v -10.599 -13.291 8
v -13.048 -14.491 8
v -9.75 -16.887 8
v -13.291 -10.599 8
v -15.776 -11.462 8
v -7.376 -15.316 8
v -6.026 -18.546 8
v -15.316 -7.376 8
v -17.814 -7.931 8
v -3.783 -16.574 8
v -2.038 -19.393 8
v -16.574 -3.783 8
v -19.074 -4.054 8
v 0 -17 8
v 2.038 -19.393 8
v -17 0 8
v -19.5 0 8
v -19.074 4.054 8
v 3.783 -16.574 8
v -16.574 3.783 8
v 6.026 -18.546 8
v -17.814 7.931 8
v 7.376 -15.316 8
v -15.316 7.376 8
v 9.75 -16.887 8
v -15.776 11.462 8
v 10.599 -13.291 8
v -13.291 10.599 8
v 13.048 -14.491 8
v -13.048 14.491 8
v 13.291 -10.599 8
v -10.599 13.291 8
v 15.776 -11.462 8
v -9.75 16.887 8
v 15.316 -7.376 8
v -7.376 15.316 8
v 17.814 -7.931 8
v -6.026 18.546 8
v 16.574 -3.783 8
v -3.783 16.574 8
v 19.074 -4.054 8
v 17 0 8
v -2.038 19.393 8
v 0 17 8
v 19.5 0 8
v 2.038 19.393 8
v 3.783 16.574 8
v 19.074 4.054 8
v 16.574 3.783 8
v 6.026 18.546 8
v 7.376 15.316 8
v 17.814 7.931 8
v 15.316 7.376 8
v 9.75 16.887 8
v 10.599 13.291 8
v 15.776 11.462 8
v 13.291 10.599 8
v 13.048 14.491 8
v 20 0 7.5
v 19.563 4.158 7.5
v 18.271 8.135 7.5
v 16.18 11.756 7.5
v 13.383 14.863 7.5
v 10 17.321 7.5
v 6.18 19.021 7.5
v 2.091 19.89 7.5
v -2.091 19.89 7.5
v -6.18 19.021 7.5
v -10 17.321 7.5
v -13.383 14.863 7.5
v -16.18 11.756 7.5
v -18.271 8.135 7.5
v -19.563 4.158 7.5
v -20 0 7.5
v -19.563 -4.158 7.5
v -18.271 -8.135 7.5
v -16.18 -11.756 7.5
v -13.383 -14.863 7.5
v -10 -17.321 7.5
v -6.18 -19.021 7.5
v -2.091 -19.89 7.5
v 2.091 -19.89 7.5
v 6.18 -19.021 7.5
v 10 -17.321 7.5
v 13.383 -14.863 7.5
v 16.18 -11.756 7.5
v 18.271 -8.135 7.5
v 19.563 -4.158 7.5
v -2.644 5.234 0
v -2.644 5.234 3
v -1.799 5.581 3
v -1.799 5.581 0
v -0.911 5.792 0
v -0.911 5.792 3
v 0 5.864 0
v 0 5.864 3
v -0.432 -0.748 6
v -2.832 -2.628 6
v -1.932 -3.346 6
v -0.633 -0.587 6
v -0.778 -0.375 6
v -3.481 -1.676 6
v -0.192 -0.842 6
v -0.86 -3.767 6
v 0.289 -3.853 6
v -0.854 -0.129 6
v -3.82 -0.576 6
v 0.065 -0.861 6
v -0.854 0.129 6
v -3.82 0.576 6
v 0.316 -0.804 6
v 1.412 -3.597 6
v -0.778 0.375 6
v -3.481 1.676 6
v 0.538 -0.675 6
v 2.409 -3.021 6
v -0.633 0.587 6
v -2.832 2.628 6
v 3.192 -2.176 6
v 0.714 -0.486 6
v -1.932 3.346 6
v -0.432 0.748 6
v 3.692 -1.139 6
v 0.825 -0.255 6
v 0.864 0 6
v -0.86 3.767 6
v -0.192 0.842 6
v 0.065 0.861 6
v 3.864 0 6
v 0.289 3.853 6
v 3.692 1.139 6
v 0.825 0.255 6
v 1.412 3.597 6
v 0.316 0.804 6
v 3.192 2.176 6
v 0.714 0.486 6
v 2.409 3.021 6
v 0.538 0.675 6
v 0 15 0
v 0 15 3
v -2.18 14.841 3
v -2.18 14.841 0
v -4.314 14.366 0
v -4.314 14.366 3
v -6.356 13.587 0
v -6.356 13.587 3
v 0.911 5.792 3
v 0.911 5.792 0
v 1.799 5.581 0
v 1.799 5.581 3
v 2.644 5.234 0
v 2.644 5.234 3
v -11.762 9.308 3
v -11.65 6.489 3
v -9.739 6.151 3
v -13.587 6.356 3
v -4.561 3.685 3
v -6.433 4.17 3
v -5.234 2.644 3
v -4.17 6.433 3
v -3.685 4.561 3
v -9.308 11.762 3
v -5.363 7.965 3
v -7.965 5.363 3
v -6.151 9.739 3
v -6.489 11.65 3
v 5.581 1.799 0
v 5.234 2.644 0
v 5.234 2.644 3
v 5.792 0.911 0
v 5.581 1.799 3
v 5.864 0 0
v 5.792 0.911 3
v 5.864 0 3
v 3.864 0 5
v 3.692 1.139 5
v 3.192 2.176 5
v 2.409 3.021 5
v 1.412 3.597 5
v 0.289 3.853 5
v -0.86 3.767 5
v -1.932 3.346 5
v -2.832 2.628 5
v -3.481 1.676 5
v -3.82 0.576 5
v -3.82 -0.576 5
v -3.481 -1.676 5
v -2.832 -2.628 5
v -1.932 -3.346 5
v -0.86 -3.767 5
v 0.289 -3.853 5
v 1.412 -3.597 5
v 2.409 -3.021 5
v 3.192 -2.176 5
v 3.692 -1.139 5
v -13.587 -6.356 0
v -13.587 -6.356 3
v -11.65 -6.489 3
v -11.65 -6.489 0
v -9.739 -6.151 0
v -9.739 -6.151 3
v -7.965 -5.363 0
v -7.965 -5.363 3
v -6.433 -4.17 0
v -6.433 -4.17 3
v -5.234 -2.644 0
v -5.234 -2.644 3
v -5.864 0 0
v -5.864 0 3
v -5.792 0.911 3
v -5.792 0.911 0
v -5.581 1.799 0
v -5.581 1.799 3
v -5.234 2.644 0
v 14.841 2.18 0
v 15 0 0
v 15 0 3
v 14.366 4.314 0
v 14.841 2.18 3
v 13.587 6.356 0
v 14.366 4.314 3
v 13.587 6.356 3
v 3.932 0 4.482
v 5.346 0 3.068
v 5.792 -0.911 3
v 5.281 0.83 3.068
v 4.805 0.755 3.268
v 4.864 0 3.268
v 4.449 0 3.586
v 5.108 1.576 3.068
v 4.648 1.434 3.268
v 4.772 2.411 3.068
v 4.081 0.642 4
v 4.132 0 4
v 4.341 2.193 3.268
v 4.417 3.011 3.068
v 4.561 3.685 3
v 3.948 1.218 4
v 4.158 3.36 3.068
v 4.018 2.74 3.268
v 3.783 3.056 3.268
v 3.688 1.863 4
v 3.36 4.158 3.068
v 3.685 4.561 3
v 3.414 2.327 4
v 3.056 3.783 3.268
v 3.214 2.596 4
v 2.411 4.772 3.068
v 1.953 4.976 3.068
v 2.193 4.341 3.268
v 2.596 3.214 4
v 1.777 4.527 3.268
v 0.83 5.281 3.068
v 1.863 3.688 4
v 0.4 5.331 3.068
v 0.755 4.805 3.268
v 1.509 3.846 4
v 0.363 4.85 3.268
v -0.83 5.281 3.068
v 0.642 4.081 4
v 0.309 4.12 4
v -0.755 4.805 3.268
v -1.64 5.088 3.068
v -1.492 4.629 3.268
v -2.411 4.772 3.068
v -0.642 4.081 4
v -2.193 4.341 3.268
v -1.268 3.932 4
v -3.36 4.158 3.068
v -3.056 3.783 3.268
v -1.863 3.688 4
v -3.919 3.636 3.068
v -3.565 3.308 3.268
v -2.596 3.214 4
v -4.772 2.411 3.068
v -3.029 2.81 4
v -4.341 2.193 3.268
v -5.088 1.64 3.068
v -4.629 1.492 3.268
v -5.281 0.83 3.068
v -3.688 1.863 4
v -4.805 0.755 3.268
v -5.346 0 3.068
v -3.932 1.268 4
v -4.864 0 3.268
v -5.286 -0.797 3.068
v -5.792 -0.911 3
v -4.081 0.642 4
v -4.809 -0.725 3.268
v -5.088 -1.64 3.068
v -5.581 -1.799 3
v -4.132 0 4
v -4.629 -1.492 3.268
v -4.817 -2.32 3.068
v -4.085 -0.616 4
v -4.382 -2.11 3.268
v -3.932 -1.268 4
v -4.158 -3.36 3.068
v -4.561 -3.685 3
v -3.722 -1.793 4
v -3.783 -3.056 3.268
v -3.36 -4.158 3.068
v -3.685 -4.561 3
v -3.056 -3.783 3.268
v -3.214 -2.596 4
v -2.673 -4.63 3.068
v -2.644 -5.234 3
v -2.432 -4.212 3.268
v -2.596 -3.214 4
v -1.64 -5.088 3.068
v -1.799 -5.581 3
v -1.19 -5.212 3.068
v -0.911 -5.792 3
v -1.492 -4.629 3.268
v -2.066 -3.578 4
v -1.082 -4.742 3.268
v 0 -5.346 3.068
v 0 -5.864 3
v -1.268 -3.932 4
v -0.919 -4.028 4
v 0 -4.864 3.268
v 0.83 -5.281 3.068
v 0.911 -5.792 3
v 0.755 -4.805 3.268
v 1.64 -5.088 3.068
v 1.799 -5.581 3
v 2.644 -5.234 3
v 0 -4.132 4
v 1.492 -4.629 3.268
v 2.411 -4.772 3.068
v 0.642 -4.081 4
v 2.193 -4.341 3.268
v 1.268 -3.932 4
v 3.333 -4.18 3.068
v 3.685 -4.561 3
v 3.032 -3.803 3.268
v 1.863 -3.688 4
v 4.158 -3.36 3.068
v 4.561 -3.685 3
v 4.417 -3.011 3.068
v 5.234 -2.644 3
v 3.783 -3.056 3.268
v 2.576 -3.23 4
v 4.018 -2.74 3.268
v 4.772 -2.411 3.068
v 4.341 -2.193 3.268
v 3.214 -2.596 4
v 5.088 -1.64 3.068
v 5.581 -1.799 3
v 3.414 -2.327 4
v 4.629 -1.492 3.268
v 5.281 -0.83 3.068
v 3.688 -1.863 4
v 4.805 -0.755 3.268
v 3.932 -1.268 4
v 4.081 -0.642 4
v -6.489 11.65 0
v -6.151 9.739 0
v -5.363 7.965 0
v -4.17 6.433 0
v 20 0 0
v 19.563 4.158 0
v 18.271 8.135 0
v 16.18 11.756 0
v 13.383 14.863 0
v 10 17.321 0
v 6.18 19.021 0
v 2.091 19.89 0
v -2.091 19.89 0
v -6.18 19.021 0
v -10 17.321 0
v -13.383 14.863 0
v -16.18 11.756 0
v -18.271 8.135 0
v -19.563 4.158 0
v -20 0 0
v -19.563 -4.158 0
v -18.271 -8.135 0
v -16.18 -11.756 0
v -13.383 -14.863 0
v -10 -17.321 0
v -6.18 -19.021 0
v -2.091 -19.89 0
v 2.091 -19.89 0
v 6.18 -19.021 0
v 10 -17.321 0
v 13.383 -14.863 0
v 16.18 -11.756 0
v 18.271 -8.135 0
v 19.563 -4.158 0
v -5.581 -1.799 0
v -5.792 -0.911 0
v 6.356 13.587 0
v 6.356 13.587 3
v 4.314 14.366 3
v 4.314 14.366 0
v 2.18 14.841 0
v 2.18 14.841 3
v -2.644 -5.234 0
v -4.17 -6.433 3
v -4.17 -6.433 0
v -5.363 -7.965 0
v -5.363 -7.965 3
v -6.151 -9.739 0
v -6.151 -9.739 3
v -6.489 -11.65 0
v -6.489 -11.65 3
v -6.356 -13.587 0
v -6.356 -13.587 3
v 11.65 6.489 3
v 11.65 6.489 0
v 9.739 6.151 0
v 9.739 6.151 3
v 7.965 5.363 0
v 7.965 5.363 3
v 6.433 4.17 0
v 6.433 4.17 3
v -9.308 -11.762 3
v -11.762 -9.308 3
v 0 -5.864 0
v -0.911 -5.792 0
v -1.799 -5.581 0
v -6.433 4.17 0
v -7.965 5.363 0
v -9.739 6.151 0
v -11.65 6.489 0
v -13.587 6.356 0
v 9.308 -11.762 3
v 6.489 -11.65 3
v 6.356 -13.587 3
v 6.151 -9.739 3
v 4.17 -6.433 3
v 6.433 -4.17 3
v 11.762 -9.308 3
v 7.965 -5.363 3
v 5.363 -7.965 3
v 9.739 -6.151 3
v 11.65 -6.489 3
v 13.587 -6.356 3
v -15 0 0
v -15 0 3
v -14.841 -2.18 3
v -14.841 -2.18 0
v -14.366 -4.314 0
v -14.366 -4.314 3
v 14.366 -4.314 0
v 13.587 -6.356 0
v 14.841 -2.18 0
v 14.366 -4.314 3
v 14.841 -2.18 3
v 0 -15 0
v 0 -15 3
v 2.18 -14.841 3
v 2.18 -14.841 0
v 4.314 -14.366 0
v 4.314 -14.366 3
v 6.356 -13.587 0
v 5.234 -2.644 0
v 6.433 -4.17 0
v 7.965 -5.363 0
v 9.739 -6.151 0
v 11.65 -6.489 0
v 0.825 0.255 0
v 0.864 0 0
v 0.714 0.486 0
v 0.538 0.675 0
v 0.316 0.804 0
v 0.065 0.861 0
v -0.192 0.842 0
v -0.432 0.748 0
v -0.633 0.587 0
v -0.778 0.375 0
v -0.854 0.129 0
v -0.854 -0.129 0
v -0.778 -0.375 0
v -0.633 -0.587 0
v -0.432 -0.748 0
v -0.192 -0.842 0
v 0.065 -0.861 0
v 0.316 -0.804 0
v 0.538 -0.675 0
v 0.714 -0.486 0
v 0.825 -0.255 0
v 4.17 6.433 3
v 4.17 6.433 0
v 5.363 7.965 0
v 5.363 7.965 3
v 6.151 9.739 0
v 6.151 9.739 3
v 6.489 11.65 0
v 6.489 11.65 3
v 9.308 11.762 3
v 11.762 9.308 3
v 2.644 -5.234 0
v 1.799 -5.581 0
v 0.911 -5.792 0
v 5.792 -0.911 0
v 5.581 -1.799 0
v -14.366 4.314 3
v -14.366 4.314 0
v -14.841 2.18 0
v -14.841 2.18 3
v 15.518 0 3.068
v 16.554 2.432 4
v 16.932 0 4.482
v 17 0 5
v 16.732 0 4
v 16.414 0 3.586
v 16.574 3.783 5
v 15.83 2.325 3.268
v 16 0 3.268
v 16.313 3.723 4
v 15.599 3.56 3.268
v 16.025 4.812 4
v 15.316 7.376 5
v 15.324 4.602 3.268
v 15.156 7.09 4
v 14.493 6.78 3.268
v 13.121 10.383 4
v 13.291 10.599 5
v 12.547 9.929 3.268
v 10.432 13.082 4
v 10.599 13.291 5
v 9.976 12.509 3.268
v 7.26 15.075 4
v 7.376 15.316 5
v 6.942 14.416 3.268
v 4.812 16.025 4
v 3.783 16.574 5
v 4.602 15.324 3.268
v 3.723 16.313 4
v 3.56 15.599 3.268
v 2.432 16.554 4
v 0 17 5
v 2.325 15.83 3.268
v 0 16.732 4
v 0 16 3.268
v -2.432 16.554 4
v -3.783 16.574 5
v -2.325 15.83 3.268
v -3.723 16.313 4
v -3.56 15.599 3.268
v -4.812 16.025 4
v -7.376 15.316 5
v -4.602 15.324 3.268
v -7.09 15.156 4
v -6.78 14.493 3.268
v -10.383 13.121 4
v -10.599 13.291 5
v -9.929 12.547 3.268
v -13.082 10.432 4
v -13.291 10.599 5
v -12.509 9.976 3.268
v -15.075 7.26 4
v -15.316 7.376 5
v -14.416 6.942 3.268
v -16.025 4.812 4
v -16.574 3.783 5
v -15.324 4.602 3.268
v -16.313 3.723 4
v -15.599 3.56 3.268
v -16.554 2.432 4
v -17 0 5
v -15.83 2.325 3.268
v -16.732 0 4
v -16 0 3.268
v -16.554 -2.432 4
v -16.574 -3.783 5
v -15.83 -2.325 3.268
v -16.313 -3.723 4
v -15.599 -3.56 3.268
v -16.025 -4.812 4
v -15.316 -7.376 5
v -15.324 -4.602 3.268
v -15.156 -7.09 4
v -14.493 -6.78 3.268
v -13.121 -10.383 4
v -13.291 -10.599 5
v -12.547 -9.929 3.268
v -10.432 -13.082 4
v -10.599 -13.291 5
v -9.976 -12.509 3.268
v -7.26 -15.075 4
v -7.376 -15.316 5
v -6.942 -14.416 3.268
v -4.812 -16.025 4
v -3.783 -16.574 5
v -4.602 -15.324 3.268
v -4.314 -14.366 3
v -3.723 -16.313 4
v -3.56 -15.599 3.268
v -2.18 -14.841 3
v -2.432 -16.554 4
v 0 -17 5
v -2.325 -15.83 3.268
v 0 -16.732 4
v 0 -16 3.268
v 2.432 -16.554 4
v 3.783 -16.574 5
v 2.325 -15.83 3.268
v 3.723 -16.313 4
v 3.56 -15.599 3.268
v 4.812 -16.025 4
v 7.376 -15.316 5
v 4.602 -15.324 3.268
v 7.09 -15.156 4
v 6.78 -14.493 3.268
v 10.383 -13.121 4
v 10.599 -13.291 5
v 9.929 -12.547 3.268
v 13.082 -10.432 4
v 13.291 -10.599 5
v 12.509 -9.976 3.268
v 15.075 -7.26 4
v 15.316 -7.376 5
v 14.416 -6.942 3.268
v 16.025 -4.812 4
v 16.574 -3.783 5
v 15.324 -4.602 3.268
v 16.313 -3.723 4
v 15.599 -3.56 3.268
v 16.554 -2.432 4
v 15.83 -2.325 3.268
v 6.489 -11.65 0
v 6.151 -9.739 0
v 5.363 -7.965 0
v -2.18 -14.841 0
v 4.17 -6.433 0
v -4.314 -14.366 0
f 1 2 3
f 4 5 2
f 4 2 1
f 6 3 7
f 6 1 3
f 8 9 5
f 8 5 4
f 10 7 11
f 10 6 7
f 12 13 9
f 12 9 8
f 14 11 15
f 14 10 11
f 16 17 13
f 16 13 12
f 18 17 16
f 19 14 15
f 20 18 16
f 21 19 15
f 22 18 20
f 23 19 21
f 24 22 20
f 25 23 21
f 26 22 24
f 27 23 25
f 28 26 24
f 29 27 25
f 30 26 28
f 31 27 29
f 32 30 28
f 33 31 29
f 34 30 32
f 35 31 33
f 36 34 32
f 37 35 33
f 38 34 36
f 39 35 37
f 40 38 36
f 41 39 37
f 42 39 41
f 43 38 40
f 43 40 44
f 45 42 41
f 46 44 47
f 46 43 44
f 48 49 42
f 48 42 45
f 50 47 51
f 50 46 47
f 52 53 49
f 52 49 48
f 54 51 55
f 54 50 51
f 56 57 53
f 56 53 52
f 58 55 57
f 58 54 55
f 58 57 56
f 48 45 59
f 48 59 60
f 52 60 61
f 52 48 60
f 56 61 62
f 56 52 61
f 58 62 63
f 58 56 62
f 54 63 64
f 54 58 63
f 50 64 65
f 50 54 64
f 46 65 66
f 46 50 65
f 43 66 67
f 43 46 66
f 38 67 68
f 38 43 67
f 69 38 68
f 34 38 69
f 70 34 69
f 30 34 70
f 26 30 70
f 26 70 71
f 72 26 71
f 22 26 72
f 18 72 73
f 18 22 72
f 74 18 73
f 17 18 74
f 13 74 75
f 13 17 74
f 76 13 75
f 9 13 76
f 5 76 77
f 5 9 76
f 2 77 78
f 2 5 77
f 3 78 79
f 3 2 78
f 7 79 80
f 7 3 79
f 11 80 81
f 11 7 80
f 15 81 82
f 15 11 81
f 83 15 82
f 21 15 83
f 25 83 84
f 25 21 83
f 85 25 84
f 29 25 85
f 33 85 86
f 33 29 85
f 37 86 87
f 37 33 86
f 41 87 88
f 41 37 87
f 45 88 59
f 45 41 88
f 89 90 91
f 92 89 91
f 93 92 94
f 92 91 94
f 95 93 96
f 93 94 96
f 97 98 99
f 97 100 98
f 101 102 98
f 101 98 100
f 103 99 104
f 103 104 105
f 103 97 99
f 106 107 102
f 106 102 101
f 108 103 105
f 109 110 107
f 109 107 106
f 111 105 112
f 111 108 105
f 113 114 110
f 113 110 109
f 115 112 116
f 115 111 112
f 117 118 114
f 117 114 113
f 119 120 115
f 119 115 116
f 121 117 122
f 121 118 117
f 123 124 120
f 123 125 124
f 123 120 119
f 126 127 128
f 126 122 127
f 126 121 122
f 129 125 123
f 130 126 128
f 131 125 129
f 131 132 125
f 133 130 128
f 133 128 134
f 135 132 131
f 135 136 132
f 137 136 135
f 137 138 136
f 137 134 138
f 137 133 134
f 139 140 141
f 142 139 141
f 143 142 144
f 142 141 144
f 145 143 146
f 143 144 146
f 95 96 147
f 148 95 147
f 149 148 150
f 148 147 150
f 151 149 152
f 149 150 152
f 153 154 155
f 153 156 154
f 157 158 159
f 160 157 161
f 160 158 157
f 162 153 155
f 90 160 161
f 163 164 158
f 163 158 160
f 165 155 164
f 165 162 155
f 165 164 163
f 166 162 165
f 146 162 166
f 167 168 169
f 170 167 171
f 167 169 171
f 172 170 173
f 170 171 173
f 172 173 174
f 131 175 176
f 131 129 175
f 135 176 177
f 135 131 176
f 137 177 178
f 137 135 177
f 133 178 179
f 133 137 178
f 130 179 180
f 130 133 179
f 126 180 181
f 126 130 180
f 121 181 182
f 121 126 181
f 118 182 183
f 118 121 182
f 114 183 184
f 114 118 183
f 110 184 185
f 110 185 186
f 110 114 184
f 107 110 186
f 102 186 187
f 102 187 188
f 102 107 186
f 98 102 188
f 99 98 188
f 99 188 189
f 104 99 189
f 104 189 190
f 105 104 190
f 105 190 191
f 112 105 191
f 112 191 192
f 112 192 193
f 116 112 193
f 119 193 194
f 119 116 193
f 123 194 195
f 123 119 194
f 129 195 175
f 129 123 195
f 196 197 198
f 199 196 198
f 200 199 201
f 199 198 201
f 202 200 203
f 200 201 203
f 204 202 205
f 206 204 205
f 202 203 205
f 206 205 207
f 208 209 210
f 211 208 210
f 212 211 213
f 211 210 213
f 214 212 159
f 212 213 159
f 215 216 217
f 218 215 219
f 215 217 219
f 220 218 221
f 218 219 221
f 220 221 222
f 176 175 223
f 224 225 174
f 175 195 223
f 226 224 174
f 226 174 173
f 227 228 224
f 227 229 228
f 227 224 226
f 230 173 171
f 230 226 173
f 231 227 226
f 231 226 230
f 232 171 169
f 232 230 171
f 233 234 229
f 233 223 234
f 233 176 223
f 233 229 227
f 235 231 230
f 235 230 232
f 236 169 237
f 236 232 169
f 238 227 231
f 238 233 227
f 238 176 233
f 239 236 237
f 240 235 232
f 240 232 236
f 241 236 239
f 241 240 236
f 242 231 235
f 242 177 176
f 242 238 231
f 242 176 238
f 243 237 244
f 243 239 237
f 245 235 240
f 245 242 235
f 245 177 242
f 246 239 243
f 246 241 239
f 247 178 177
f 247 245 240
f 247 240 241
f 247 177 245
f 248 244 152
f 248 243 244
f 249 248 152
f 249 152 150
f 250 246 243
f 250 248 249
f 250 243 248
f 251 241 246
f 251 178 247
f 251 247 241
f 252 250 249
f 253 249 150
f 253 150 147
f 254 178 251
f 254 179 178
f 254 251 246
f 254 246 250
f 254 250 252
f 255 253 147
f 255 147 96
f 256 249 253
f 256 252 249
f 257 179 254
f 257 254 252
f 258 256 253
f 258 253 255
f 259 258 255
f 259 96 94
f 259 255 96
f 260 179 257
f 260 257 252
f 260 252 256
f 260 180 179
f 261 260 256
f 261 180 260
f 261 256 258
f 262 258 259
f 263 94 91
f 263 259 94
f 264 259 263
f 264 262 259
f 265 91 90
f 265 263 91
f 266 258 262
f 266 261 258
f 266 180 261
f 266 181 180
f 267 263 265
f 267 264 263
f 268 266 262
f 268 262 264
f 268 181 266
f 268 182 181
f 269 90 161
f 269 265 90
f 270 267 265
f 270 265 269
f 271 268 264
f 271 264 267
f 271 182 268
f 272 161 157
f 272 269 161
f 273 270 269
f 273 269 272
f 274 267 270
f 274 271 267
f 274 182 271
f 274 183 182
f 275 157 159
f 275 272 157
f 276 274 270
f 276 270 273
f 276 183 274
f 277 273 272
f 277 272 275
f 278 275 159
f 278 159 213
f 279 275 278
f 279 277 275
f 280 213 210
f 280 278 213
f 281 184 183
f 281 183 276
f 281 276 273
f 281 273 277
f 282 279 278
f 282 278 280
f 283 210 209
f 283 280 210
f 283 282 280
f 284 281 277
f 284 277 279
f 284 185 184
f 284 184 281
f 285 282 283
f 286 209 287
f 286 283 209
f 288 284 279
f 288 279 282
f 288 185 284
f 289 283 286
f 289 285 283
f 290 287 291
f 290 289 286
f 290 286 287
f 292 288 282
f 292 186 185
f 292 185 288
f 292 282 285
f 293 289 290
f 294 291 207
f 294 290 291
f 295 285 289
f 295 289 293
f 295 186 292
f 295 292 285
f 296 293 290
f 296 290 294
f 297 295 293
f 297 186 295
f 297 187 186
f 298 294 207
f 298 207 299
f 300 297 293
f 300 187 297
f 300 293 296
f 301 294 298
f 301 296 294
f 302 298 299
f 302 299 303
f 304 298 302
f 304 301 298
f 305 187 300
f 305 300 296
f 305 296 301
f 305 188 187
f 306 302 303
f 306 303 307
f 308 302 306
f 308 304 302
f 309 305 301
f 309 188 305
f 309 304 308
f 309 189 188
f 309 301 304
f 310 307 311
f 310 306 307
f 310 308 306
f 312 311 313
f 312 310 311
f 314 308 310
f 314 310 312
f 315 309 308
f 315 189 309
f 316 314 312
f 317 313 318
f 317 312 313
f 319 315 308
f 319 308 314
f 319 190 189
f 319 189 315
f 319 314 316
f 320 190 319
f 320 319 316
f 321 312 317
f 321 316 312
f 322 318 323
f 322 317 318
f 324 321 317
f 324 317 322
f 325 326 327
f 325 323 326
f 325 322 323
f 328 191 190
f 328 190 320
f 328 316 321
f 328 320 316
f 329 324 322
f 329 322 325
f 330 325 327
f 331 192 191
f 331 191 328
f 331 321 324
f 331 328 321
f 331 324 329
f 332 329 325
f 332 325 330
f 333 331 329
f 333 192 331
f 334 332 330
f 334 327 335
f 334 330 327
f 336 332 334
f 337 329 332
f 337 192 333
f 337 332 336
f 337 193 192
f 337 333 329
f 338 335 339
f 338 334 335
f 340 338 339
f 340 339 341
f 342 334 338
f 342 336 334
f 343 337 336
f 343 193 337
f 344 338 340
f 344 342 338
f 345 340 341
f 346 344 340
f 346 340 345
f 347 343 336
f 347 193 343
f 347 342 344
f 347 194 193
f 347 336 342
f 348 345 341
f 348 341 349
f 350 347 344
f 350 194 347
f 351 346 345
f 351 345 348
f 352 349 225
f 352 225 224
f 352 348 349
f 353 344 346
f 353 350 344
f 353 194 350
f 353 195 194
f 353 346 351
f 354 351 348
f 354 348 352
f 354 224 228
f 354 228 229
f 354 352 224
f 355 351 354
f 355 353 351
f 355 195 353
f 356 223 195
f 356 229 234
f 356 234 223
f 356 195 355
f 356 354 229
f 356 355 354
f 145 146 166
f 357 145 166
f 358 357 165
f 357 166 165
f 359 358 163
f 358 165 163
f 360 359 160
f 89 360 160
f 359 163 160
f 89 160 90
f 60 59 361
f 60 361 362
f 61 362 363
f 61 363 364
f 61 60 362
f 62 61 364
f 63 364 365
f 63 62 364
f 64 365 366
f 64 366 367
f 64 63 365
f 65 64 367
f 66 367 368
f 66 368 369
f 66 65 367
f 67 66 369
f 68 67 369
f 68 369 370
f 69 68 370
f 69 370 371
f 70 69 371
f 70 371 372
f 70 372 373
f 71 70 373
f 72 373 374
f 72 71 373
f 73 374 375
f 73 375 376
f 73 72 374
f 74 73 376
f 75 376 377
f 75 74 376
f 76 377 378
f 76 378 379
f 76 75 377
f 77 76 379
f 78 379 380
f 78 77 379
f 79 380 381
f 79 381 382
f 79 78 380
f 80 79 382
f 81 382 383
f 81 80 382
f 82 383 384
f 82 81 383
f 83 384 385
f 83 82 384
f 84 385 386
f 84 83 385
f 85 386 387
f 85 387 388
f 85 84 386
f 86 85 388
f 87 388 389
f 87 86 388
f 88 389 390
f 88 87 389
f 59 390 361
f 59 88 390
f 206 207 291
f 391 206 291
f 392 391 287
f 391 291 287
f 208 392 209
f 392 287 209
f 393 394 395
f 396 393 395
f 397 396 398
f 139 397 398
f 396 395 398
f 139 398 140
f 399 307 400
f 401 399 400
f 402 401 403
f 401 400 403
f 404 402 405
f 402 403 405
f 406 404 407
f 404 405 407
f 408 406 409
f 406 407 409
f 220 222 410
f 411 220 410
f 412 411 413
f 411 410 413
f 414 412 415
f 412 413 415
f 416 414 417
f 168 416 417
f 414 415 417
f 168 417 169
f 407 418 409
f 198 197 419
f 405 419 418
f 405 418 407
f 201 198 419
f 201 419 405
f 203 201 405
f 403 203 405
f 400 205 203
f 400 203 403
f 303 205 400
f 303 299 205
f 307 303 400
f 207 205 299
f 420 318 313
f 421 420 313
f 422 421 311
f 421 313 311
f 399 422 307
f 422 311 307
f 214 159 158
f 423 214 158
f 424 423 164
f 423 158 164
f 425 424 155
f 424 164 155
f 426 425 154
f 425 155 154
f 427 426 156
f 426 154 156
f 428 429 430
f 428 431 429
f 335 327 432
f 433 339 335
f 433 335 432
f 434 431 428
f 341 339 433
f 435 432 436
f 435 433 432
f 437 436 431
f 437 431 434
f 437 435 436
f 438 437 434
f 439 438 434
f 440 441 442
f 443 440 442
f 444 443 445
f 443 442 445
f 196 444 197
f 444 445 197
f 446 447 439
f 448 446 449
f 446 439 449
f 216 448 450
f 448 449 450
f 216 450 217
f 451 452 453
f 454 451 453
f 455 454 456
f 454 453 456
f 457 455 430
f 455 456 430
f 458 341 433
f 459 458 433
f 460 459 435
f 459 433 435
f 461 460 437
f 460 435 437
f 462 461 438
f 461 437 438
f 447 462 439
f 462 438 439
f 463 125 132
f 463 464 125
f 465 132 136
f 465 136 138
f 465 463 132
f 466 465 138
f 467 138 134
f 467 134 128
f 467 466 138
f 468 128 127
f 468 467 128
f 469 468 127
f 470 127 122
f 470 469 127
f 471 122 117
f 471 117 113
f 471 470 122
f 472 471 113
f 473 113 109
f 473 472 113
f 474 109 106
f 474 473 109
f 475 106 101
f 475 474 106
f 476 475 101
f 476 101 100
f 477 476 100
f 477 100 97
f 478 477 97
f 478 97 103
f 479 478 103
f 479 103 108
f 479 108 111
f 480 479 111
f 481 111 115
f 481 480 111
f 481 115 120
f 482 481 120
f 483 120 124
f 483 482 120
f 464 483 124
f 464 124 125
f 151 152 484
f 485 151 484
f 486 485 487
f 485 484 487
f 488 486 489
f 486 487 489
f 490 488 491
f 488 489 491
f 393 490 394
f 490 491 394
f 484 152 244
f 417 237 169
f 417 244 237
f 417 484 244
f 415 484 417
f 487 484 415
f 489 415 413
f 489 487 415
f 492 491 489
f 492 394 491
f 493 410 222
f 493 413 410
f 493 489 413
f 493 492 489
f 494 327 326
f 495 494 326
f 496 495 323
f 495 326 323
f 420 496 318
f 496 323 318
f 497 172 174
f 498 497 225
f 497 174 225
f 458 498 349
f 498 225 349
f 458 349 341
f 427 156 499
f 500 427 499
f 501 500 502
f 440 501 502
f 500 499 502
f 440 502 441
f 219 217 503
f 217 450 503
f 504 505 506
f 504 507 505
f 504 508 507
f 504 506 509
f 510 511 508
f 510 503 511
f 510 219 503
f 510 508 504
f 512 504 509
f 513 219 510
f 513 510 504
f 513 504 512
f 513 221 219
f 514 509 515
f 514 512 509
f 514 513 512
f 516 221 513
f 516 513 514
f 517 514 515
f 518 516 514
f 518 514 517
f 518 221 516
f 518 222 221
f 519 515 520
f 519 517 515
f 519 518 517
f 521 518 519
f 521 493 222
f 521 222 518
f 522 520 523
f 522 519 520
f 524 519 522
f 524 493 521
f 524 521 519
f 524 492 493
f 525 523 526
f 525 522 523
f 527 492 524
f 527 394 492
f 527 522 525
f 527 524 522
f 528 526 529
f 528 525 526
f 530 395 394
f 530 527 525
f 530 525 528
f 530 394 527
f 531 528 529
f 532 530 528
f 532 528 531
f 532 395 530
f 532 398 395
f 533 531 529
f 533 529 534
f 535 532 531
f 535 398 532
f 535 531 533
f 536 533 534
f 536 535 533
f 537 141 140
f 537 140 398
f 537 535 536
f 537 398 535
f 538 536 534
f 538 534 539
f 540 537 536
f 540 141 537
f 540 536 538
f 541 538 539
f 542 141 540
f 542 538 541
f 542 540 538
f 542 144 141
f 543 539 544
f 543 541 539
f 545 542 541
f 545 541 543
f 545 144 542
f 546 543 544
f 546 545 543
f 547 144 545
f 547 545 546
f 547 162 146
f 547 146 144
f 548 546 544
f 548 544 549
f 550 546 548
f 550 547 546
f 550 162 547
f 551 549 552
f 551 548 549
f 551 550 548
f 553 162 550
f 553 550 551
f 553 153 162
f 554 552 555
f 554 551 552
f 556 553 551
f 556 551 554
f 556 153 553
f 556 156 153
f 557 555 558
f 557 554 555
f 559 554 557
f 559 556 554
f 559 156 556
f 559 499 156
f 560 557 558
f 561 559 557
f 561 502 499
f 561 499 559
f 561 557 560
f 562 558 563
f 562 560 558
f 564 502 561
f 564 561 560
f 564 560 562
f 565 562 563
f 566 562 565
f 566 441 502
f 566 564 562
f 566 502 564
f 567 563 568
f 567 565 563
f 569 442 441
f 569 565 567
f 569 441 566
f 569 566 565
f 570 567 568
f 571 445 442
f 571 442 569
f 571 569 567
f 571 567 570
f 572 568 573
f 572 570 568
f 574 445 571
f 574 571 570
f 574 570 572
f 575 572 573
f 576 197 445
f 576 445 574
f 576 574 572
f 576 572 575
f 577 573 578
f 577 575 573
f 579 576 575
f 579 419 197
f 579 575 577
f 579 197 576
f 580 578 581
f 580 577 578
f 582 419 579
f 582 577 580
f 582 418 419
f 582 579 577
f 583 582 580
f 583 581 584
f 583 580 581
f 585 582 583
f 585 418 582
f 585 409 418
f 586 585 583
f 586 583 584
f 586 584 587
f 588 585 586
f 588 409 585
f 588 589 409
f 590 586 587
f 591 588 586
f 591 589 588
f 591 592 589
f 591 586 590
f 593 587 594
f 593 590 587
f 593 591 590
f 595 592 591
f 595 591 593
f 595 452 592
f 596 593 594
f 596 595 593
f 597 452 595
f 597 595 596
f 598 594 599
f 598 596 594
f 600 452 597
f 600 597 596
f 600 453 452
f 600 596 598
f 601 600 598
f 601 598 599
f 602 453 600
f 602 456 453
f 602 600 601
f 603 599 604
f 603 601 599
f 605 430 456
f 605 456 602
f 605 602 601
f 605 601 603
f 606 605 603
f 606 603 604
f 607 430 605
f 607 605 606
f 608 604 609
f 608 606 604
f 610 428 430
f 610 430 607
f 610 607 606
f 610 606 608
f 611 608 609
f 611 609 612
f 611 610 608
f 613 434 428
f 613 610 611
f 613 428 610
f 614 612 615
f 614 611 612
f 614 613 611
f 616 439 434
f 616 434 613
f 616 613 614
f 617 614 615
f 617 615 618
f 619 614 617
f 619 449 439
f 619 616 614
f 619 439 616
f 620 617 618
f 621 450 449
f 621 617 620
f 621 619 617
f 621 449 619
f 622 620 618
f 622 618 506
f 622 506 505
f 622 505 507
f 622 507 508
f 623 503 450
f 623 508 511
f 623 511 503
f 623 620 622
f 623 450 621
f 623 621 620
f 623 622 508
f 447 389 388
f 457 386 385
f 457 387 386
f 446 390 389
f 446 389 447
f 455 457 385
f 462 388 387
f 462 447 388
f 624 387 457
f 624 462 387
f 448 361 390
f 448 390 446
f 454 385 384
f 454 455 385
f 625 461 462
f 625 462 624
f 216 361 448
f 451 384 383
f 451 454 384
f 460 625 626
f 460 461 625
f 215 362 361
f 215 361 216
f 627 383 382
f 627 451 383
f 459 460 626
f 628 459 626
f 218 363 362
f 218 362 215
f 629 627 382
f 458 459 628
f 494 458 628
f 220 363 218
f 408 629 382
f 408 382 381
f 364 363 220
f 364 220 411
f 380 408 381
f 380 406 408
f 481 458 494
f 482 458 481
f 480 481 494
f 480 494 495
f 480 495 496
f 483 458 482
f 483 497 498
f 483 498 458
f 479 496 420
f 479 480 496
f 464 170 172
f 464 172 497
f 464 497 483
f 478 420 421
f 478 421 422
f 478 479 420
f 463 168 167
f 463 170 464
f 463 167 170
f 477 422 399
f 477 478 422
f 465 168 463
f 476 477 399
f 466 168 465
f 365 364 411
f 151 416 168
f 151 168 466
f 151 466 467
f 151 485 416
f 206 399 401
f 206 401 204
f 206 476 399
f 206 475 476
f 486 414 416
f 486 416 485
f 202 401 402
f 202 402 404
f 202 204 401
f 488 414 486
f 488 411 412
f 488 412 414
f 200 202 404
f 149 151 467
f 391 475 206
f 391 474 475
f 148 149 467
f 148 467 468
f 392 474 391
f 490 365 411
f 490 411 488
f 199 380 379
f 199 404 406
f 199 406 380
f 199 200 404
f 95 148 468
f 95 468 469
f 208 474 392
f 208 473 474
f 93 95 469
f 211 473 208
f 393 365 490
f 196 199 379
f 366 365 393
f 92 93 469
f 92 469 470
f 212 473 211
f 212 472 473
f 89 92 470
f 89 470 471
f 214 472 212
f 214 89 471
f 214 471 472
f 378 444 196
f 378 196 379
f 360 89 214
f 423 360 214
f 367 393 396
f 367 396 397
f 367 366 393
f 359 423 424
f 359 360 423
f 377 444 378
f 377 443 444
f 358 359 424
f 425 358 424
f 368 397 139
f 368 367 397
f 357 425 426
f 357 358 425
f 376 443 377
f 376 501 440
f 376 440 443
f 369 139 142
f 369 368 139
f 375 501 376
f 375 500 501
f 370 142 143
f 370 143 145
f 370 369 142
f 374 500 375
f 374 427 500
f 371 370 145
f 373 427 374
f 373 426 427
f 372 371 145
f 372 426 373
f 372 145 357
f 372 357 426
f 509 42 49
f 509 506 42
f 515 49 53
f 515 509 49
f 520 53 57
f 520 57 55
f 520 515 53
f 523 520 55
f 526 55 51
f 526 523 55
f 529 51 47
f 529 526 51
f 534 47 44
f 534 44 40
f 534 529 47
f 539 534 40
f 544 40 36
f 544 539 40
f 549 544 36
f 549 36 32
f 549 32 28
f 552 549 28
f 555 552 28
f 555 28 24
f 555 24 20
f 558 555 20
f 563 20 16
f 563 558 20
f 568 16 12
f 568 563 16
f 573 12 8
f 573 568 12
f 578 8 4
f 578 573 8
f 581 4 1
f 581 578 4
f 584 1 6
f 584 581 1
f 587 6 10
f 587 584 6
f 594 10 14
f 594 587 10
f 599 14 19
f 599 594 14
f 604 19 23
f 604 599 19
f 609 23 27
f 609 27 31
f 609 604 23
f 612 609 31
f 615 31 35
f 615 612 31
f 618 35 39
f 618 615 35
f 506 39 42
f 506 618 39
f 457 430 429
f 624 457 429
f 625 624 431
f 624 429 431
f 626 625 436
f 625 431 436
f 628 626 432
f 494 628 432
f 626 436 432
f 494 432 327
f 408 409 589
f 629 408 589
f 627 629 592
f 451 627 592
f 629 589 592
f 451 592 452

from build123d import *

# Parameters (mm, degrees)
F2_SIZE  = 0.5
F4_DEPTH = 3


with BuildPart() as f1:
    # F0 (on Front) → F1 (revolve)
    with BuildSketch(Plane.XZ):
        with BuildLine():
            Line((0.8636, 6), (0.8636, 0))
            Line((0.8636, 0), (20, 0))
            Line((20, 0), (20, 8))
            Line((20, 8), (17, 8))
            Line((17, 8), (17, 5))
            ThreePointArc((17, 5), (16.4142135624, 3.5857864376), (15, 3))
            Line((15, 3), (5.8636, 3))
            ThreePointArc((5.8636, 3), (4.4493864376, 3.5857864376), (3.8636, 5))
            Line((3.8636, 5), (3.8636, 6))
            Line((3.8636, 6), (0.8636, 6))
        make_face()
    revolve(axis=Axis((0, 0, 9.2181318827), (0, 0, 1)))

    # F2
    f2_edges = [f1.edges().sort_by_distance(p)[0] for p in [
        (-20, 0, 8),
    ]]
    chamfer(f2_edges, length=F2_SIZE)

    # F3 (on face) → F4 (cut, through all)
    with BuildSketch(Plane.XY.offset(3)):
        with BuildLine():
            ThreePointArc((13.5867362981, 6.3561463771), (8.8277844457, 5.8106888065), (5.2335374725, 2.6442183124))
            ThreePointArc((5.2335374725, 2.6442183124), (5.7039098557, 1.3591237317), (5.8636, 0))
            ThreePointArc((5.8636, 0), (5.7039098557, -1.3591237317), (5.2335374725, -2.6442183124))
            ThreePointArc((5.2335374725, -2.6442183124), (8.8277844457, -5.8106888065), (13.5867362981, -6.3561463771))
            ThreePointArc((13.5867362981, -6.3561463771), (14.6424220071, -3.2556839166), (15, 0))
            ThreePointArc((15, 0), (14.6424220071, 3.2556839166), (13.5867362981, 6.3561463771))
        make_face()
        with BuildLine():
            ThreePointArc((0, 15), (-3.2556839166, 14.6424220071), (-6.3561463771, 13.5867362981))
            ThreePointArc((-6.3561463771, 13.5867362981), (-5.8106888065, 8.8277844457), (-2.6442183124, 5.2335374725))
            ThreePointArc((-2.6442183124, 5.2335374725), (-1.3591237317, 5.7039098557), (0, 5.8636))
            ThreePointArc((0, 5.8636), (1.3591237317, 5.7039098557), (2.6442183124, 5.2335374725))
            ThreePointArc((2.6442183124, 5.2335374725), (5.8106888065, 8.8277844457), (6.3561463771, 13.5867362981))
            ThreePointArc((6.3561463771, 13.5867362981), (3.2556839166, 14.6424220071), (0, 15))
        make_face()
        with BuildLine():
            ThreePointArc((-15, 0), (-14.6424220071, -3.2556839166), (-13.5867362981, -6.3561463771))
            ThreePointArc((-13.5867362981, -6.3561463771), (-8.8277844457, -5.8106888065), (-5.2335374725, -2.6442183124))
            ThreePointArc((-5.2335374725, -2.6442183124), (-5.7039098557, -1.3591237317), (-5.8636, 0))
            ThreePointArc((-5.8636, 0), (-5.7039098557, 1.3591237317), (-5.2335374725, 2.6442183124))
            ThreePointArc((-5.2335374725, 2.6442183124), (-8.8277844457, 5.8106888065), (-13.5867362981, 6.3561463771))
            ThreePointArc((-13.5867362981, 6.3561463771), (-14.6424220071, 3.2556839166), (-15, 0))
        make_face()
        with BuildLine():
            ThreePointArc((0, -15), (3.2556839166, -14.6424220071), (6.3561463771, -13.5867362981))
            ThreePointArc((6.3561463771, -13.5867362981), (5.8106888065, -8.8277844457), (2.6442183124, -5.2335374725))
            ThreePointArc((2.6442183124, -5.2335374725), (1.3591237317, -5.7039098557), (0, -5.8636))
            ThreePointArc((0, -5.8636), (-1.3591237317, -5.7039098557), (-2.6442183124, -5.2335374725))
            ThreePointArc((-2.6442183124, -5.2335374725), (-5.8106888065, -8.8277844457), (-6.3561463771, -13.5867362981))
            ThreePointArc((-6.3561463771, -13.5867362981), (-3.2556839166, -14.6424220071), (0, -15))
        make_face()
    extrude(amount=-F4_DEPTH, mode=Mode.SUBTRACT)


solid = f1.part
